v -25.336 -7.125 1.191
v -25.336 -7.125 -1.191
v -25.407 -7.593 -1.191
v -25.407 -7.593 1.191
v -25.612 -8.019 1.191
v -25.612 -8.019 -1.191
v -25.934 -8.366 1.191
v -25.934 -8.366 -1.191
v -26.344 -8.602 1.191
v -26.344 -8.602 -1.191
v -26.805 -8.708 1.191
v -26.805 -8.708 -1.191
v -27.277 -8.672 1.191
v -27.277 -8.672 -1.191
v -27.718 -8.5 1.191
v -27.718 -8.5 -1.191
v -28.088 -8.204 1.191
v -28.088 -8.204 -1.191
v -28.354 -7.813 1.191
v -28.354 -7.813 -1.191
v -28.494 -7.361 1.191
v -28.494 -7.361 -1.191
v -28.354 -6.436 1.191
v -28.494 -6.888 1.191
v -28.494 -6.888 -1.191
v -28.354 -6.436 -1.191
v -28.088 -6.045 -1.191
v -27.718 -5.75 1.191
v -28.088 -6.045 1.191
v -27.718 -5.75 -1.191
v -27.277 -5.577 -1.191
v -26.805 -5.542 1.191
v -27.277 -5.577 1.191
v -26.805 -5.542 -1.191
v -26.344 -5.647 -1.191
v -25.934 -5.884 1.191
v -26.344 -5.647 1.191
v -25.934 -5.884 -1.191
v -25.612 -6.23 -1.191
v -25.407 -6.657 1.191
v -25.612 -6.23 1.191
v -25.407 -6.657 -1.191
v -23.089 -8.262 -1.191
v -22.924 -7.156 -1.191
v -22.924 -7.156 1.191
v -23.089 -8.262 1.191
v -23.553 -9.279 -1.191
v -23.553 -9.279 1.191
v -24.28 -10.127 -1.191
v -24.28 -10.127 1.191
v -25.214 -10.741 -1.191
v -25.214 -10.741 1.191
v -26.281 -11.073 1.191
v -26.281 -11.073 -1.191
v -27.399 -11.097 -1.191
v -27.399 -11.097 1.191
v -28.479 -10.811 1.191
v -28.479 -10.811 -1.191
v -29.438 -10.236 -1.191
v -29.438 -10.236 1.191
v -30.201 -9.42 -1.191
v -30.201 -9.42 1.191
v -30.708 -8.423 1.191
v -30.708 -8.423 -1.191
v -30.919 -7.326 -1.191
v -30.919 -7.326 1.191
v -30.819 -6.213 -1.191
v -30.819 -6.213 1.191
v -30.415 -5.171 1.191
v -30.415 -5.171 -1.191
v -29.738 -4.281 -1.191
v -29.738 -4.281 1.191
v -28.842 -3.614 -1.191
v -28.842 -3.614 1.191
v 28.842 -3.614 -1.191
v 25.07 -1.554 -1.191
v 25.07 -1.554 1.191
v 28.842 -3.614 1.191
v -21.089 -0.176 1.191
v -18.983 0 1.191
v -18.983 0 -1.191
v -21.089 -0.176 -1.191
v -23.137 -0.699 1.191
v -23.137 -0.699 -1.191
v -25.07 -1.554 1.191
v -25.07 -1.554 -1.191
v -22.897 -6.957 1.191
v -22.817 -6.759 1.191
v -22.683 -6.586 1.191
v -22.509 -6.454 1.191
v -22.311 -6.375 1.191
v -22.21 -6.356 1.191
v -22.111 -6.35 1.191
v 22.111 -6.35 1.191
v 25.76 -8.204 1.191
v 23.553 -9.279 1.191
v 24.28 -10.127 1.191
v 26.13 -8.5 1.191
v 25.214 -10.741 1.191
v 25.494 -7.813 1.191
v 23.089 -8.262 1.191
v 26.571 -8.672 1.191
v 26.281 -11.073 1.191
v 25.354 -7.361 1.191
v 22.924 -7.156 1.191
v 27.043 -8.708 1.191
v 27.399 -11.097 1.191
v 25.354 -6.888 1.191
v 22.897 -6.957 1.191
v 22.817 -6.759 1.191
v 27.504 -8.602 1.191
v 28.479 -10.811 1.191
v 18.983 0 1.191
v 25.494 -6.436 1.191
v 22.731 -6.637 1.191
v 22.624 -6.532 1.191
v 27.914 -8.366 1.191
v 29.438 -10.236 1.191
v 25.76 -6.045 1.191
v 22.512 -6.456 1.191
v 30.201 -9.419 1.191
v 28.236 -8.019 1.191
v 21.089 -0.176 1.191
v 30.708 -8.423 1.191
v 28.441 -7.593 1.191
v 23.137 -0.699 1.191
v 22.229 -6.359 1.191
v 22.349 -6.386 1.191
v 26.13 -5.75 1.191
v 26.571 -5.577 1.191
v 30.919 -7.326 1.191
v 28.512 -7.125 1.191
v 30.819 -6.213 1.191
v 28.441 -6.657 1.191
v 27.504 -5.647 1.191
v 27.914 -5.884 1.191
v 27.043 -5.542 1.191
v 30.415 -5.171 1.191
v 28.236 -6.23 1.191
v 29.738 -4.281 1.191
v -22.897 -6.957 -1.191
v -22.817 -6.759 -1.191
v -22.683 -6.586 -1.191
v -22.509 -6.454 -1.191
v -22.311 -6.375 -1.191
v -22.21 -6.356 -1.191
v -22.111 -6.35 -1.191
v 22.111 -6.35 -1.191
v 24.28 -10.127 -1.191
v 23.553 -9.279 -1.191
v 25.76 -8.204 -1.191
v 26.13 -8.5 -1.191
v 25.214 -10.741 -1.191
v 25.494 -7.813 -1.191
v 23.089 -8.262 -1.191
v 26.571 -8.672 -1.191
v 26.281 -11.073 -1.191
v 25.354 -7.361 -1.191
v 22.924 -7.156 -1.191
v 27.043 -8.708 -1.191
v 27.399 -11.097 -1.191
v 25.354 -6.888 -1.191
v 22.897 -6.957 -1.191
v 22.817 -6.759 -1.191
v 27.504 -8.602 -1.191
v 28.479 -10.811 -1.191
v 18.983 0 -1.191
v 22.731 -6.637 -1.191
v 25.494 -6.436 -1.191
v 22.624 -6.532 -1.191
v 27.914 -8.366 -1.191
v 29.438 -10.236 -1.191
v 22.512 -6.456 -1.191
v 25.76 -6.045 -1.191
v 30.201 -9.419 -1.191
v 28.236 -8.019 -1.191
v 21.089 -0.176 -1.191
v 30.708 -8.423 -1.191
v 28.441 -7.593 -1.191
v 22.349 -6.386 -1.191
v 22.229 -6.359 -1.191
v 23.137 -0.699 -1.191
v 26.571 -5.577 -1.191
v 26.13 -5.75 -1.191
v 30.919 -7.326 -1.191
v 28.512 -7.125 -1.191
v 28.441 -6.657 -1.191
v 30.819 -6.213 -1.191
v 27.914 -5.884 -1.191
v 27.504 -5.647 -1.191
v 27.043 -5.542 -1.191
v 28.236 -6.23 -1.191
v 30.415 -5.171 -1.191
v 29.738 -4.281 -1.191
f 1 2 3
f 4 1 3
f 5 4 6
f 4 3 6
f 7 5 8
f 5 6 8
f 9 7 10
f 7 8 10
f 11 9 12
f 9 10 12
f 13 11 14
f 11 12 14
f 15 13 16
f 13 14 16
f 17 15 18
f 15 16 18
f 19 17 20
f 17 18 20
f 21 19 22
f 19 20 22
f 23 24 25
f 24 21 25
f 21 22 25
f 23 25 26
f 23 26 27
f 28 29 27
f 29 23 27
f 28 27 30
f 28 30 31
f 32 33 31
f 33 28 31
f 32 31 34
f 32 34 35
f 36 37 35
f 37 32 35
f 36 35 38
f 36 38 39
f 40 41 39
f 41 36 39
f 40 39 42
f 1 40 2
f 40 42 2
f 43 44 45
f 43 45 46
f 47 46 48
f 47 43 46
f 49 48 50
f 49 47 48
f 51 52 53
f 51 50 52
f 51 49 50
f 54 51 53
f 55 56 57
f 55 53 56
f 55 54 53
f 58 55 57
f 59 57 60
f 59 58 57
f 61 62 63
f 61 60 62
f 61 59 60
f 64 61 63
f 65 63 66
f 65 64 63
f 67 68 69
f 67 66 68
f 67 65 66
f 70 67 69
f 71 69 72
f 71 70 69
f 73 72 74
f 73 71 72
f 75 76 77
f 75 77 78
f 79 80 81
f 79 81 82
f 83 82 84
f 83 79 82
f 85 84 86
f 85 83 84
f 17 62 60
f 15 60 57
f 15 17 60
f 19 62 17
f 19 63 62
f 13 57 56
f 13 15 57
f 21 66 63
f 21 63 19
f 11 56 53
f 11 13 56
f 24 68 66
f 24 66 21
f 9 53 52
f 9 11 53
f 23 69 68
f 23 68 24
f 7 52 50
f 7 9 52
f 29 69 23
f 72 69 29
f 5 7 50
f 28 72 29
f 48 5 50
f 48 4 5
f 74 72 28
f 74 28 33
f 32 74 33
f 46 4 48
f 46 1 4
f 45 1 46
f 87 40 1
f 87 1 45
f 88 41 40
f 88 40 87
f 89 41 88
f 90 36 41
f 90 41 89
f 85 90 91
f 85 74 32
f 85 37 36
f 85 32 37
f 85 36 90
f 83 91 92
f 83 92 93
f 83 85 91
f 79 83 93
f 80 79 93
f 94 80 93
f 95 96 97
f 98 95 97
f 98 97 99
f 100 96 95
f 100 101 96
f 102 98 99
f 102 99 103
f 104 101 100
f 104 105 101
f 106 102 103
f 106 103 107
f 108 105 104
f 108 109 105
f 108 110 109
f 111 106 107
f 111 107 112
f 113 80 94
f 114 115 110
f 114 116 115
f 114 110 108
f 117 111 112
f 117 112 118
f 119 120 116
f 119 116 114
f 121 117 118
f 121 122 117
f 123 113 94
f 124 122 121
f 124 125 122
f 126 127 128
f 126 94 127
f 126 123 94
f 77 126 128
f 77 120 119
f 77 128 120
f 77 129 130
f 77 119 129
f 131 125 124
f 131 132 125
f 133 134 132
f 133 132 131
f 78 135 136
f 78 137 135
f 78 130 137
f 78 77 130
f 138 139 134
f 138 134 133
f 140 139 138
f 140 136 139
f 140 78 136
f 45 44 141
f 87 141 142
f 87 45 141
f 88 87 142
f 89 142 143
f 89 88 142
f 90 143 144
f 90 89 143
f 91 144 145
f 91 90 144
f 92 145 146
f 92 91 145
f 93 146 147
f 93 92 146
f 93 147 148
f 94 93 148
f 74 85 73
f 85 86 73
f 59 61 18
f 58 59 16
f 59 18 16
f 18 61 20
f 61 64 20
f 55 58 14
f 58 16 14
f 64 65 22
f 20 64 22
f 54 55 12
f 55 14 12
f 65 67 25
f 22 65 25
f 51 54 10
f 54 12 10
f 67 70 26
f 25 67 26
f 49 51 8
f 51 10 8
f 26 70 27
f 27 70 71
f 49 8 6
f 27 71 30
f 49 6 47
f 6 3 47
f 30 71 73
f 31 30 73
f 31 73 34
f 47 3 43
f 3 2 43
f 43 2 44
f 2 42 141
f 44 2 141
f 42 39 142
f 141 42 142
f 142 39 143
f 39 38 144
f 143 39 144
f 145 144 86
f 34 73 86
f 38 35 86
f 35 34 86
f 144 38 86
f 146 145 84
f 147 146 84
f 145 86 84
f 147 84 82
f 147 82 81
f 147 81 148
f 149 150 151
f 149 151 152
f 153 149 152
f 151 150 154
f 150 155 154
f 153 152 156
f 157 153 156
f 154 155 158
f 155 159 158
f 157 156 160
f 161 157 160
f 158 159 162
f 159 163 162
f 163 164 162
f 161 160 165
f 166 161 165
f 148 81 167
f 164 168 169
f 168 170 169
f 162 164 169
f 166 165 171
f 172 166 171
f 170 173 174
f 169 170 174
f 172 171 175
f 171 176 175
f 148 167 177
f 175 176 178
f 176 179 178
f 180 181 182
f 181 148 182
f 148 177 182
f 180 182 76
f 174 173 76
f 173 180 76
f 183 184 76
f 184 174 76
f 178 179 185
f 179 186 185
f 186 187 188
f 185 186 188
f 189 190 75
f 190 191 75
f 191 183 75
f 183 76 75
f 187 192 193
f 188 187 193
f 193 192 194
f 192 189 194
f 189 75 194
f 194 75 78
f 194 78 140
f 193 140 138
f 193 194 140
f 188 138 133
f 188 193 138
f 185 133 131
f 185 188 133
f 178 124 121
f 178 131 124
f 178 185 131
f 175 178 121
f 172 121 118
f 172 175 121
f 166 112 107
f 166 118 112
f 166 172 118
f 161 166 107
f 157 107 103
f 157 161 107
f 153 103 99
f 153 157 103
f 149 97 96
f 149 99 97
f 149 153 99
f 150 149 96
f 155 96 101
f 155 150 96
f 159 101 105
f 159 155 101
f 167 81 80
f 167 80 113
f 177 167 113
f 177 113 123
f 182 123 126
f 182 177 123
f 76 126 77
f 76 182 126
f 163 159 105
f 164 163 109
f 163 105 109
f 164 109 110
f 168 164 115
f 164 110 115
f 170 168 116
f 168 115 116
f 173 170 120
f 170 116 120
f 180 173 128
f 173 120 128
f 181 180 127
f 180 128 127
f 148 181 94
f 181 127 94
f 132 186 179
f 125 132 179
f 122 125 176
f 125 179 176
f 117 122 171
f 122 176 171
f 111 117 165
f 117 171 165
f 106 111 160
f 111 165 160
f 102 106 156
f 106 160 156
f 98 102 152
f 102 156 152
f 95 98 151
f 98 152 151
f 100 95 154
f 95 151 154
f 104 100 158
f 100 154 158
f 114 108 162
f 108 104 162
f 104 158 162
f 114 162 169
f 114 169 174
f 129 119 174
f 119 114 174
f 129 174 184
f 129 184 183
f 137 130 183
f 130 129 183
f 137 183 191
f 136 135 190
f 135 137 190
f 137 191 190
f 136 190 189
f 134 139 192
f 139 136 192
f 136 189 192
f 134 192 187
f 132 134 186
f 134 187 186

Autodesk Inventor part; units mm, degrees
ref_plane "YZ Plane" through (0, 0, 0) normal (1, 0, 0) x (0, 1, 0)
ref_plane "XZ Plane" through (0, 0, 0) normal (0, 1, 0) x (-1, 0, 0)
ref_plane "XY Plane" through (0, 0, 0) normal (0, 0, 1) x (1, 0, 0)
sketch "Sketch1" plane through (0, 0, 0) normal (0, 0, 1) x (1, 0, 0)
  line L0 (-22.225, 0) -> (22.225, 0)
  line L1 (-22.225, 0) -> (-28.8416, -3.6137)
  arc A0 (-28.8416, -3.6137) -> (-22.9235, -7.1247) centre (-26.924, -7.1247) ccw
  line L2 (-22.9235, -7.1247) -> (-22.9235, -6.35)
  circle A1 centre (-26.924, -7.1247) radius 1.5875
  line L3 (0, -15.1277) -> (0, 2.5213) projected
  line L4 (22.225, 0) -> (28.8416, -3.6137)
  arc A2 (22.9235, -7.1247) -> (28.8416, -3.6137) centre (26.924, -7.1247) ccw
  line L5 (22.9235, -7.1247) -> (22.9235, -6.35)
  circle A3 centre (26.924, -7.1247) radius 1.5875
  line L6 (-22.9235, -6.35) -> (22.9235, -6.35)
  point P0 (0, 0)
  point P1 (0, 0)
  point P2 (-26.924, -11.1252)
  point P3 (26.924, -11.1252)
  dimension "d0" = 8.001
  dimension "d1" = 3.175
  dimension "d2" = 4.7752
  dimension "d3" = 6.35
  dimension "d4" = 44.45
  dimension "d5" = 53.848
extrude "Extrusion1" add sketch "Sketch1" along normal mid plane 2.3813
fillet "Fillet1" radius 12.7 2 edges at (-22.225, 0, 0) (22.225, 0, 0)
fillet "Fillet2" radius 0.8128 2 edges at (-22.9235, -6.35, 0) (22.9235, -6.35, 0)
properties part number "Front Lower Arm Brace"
